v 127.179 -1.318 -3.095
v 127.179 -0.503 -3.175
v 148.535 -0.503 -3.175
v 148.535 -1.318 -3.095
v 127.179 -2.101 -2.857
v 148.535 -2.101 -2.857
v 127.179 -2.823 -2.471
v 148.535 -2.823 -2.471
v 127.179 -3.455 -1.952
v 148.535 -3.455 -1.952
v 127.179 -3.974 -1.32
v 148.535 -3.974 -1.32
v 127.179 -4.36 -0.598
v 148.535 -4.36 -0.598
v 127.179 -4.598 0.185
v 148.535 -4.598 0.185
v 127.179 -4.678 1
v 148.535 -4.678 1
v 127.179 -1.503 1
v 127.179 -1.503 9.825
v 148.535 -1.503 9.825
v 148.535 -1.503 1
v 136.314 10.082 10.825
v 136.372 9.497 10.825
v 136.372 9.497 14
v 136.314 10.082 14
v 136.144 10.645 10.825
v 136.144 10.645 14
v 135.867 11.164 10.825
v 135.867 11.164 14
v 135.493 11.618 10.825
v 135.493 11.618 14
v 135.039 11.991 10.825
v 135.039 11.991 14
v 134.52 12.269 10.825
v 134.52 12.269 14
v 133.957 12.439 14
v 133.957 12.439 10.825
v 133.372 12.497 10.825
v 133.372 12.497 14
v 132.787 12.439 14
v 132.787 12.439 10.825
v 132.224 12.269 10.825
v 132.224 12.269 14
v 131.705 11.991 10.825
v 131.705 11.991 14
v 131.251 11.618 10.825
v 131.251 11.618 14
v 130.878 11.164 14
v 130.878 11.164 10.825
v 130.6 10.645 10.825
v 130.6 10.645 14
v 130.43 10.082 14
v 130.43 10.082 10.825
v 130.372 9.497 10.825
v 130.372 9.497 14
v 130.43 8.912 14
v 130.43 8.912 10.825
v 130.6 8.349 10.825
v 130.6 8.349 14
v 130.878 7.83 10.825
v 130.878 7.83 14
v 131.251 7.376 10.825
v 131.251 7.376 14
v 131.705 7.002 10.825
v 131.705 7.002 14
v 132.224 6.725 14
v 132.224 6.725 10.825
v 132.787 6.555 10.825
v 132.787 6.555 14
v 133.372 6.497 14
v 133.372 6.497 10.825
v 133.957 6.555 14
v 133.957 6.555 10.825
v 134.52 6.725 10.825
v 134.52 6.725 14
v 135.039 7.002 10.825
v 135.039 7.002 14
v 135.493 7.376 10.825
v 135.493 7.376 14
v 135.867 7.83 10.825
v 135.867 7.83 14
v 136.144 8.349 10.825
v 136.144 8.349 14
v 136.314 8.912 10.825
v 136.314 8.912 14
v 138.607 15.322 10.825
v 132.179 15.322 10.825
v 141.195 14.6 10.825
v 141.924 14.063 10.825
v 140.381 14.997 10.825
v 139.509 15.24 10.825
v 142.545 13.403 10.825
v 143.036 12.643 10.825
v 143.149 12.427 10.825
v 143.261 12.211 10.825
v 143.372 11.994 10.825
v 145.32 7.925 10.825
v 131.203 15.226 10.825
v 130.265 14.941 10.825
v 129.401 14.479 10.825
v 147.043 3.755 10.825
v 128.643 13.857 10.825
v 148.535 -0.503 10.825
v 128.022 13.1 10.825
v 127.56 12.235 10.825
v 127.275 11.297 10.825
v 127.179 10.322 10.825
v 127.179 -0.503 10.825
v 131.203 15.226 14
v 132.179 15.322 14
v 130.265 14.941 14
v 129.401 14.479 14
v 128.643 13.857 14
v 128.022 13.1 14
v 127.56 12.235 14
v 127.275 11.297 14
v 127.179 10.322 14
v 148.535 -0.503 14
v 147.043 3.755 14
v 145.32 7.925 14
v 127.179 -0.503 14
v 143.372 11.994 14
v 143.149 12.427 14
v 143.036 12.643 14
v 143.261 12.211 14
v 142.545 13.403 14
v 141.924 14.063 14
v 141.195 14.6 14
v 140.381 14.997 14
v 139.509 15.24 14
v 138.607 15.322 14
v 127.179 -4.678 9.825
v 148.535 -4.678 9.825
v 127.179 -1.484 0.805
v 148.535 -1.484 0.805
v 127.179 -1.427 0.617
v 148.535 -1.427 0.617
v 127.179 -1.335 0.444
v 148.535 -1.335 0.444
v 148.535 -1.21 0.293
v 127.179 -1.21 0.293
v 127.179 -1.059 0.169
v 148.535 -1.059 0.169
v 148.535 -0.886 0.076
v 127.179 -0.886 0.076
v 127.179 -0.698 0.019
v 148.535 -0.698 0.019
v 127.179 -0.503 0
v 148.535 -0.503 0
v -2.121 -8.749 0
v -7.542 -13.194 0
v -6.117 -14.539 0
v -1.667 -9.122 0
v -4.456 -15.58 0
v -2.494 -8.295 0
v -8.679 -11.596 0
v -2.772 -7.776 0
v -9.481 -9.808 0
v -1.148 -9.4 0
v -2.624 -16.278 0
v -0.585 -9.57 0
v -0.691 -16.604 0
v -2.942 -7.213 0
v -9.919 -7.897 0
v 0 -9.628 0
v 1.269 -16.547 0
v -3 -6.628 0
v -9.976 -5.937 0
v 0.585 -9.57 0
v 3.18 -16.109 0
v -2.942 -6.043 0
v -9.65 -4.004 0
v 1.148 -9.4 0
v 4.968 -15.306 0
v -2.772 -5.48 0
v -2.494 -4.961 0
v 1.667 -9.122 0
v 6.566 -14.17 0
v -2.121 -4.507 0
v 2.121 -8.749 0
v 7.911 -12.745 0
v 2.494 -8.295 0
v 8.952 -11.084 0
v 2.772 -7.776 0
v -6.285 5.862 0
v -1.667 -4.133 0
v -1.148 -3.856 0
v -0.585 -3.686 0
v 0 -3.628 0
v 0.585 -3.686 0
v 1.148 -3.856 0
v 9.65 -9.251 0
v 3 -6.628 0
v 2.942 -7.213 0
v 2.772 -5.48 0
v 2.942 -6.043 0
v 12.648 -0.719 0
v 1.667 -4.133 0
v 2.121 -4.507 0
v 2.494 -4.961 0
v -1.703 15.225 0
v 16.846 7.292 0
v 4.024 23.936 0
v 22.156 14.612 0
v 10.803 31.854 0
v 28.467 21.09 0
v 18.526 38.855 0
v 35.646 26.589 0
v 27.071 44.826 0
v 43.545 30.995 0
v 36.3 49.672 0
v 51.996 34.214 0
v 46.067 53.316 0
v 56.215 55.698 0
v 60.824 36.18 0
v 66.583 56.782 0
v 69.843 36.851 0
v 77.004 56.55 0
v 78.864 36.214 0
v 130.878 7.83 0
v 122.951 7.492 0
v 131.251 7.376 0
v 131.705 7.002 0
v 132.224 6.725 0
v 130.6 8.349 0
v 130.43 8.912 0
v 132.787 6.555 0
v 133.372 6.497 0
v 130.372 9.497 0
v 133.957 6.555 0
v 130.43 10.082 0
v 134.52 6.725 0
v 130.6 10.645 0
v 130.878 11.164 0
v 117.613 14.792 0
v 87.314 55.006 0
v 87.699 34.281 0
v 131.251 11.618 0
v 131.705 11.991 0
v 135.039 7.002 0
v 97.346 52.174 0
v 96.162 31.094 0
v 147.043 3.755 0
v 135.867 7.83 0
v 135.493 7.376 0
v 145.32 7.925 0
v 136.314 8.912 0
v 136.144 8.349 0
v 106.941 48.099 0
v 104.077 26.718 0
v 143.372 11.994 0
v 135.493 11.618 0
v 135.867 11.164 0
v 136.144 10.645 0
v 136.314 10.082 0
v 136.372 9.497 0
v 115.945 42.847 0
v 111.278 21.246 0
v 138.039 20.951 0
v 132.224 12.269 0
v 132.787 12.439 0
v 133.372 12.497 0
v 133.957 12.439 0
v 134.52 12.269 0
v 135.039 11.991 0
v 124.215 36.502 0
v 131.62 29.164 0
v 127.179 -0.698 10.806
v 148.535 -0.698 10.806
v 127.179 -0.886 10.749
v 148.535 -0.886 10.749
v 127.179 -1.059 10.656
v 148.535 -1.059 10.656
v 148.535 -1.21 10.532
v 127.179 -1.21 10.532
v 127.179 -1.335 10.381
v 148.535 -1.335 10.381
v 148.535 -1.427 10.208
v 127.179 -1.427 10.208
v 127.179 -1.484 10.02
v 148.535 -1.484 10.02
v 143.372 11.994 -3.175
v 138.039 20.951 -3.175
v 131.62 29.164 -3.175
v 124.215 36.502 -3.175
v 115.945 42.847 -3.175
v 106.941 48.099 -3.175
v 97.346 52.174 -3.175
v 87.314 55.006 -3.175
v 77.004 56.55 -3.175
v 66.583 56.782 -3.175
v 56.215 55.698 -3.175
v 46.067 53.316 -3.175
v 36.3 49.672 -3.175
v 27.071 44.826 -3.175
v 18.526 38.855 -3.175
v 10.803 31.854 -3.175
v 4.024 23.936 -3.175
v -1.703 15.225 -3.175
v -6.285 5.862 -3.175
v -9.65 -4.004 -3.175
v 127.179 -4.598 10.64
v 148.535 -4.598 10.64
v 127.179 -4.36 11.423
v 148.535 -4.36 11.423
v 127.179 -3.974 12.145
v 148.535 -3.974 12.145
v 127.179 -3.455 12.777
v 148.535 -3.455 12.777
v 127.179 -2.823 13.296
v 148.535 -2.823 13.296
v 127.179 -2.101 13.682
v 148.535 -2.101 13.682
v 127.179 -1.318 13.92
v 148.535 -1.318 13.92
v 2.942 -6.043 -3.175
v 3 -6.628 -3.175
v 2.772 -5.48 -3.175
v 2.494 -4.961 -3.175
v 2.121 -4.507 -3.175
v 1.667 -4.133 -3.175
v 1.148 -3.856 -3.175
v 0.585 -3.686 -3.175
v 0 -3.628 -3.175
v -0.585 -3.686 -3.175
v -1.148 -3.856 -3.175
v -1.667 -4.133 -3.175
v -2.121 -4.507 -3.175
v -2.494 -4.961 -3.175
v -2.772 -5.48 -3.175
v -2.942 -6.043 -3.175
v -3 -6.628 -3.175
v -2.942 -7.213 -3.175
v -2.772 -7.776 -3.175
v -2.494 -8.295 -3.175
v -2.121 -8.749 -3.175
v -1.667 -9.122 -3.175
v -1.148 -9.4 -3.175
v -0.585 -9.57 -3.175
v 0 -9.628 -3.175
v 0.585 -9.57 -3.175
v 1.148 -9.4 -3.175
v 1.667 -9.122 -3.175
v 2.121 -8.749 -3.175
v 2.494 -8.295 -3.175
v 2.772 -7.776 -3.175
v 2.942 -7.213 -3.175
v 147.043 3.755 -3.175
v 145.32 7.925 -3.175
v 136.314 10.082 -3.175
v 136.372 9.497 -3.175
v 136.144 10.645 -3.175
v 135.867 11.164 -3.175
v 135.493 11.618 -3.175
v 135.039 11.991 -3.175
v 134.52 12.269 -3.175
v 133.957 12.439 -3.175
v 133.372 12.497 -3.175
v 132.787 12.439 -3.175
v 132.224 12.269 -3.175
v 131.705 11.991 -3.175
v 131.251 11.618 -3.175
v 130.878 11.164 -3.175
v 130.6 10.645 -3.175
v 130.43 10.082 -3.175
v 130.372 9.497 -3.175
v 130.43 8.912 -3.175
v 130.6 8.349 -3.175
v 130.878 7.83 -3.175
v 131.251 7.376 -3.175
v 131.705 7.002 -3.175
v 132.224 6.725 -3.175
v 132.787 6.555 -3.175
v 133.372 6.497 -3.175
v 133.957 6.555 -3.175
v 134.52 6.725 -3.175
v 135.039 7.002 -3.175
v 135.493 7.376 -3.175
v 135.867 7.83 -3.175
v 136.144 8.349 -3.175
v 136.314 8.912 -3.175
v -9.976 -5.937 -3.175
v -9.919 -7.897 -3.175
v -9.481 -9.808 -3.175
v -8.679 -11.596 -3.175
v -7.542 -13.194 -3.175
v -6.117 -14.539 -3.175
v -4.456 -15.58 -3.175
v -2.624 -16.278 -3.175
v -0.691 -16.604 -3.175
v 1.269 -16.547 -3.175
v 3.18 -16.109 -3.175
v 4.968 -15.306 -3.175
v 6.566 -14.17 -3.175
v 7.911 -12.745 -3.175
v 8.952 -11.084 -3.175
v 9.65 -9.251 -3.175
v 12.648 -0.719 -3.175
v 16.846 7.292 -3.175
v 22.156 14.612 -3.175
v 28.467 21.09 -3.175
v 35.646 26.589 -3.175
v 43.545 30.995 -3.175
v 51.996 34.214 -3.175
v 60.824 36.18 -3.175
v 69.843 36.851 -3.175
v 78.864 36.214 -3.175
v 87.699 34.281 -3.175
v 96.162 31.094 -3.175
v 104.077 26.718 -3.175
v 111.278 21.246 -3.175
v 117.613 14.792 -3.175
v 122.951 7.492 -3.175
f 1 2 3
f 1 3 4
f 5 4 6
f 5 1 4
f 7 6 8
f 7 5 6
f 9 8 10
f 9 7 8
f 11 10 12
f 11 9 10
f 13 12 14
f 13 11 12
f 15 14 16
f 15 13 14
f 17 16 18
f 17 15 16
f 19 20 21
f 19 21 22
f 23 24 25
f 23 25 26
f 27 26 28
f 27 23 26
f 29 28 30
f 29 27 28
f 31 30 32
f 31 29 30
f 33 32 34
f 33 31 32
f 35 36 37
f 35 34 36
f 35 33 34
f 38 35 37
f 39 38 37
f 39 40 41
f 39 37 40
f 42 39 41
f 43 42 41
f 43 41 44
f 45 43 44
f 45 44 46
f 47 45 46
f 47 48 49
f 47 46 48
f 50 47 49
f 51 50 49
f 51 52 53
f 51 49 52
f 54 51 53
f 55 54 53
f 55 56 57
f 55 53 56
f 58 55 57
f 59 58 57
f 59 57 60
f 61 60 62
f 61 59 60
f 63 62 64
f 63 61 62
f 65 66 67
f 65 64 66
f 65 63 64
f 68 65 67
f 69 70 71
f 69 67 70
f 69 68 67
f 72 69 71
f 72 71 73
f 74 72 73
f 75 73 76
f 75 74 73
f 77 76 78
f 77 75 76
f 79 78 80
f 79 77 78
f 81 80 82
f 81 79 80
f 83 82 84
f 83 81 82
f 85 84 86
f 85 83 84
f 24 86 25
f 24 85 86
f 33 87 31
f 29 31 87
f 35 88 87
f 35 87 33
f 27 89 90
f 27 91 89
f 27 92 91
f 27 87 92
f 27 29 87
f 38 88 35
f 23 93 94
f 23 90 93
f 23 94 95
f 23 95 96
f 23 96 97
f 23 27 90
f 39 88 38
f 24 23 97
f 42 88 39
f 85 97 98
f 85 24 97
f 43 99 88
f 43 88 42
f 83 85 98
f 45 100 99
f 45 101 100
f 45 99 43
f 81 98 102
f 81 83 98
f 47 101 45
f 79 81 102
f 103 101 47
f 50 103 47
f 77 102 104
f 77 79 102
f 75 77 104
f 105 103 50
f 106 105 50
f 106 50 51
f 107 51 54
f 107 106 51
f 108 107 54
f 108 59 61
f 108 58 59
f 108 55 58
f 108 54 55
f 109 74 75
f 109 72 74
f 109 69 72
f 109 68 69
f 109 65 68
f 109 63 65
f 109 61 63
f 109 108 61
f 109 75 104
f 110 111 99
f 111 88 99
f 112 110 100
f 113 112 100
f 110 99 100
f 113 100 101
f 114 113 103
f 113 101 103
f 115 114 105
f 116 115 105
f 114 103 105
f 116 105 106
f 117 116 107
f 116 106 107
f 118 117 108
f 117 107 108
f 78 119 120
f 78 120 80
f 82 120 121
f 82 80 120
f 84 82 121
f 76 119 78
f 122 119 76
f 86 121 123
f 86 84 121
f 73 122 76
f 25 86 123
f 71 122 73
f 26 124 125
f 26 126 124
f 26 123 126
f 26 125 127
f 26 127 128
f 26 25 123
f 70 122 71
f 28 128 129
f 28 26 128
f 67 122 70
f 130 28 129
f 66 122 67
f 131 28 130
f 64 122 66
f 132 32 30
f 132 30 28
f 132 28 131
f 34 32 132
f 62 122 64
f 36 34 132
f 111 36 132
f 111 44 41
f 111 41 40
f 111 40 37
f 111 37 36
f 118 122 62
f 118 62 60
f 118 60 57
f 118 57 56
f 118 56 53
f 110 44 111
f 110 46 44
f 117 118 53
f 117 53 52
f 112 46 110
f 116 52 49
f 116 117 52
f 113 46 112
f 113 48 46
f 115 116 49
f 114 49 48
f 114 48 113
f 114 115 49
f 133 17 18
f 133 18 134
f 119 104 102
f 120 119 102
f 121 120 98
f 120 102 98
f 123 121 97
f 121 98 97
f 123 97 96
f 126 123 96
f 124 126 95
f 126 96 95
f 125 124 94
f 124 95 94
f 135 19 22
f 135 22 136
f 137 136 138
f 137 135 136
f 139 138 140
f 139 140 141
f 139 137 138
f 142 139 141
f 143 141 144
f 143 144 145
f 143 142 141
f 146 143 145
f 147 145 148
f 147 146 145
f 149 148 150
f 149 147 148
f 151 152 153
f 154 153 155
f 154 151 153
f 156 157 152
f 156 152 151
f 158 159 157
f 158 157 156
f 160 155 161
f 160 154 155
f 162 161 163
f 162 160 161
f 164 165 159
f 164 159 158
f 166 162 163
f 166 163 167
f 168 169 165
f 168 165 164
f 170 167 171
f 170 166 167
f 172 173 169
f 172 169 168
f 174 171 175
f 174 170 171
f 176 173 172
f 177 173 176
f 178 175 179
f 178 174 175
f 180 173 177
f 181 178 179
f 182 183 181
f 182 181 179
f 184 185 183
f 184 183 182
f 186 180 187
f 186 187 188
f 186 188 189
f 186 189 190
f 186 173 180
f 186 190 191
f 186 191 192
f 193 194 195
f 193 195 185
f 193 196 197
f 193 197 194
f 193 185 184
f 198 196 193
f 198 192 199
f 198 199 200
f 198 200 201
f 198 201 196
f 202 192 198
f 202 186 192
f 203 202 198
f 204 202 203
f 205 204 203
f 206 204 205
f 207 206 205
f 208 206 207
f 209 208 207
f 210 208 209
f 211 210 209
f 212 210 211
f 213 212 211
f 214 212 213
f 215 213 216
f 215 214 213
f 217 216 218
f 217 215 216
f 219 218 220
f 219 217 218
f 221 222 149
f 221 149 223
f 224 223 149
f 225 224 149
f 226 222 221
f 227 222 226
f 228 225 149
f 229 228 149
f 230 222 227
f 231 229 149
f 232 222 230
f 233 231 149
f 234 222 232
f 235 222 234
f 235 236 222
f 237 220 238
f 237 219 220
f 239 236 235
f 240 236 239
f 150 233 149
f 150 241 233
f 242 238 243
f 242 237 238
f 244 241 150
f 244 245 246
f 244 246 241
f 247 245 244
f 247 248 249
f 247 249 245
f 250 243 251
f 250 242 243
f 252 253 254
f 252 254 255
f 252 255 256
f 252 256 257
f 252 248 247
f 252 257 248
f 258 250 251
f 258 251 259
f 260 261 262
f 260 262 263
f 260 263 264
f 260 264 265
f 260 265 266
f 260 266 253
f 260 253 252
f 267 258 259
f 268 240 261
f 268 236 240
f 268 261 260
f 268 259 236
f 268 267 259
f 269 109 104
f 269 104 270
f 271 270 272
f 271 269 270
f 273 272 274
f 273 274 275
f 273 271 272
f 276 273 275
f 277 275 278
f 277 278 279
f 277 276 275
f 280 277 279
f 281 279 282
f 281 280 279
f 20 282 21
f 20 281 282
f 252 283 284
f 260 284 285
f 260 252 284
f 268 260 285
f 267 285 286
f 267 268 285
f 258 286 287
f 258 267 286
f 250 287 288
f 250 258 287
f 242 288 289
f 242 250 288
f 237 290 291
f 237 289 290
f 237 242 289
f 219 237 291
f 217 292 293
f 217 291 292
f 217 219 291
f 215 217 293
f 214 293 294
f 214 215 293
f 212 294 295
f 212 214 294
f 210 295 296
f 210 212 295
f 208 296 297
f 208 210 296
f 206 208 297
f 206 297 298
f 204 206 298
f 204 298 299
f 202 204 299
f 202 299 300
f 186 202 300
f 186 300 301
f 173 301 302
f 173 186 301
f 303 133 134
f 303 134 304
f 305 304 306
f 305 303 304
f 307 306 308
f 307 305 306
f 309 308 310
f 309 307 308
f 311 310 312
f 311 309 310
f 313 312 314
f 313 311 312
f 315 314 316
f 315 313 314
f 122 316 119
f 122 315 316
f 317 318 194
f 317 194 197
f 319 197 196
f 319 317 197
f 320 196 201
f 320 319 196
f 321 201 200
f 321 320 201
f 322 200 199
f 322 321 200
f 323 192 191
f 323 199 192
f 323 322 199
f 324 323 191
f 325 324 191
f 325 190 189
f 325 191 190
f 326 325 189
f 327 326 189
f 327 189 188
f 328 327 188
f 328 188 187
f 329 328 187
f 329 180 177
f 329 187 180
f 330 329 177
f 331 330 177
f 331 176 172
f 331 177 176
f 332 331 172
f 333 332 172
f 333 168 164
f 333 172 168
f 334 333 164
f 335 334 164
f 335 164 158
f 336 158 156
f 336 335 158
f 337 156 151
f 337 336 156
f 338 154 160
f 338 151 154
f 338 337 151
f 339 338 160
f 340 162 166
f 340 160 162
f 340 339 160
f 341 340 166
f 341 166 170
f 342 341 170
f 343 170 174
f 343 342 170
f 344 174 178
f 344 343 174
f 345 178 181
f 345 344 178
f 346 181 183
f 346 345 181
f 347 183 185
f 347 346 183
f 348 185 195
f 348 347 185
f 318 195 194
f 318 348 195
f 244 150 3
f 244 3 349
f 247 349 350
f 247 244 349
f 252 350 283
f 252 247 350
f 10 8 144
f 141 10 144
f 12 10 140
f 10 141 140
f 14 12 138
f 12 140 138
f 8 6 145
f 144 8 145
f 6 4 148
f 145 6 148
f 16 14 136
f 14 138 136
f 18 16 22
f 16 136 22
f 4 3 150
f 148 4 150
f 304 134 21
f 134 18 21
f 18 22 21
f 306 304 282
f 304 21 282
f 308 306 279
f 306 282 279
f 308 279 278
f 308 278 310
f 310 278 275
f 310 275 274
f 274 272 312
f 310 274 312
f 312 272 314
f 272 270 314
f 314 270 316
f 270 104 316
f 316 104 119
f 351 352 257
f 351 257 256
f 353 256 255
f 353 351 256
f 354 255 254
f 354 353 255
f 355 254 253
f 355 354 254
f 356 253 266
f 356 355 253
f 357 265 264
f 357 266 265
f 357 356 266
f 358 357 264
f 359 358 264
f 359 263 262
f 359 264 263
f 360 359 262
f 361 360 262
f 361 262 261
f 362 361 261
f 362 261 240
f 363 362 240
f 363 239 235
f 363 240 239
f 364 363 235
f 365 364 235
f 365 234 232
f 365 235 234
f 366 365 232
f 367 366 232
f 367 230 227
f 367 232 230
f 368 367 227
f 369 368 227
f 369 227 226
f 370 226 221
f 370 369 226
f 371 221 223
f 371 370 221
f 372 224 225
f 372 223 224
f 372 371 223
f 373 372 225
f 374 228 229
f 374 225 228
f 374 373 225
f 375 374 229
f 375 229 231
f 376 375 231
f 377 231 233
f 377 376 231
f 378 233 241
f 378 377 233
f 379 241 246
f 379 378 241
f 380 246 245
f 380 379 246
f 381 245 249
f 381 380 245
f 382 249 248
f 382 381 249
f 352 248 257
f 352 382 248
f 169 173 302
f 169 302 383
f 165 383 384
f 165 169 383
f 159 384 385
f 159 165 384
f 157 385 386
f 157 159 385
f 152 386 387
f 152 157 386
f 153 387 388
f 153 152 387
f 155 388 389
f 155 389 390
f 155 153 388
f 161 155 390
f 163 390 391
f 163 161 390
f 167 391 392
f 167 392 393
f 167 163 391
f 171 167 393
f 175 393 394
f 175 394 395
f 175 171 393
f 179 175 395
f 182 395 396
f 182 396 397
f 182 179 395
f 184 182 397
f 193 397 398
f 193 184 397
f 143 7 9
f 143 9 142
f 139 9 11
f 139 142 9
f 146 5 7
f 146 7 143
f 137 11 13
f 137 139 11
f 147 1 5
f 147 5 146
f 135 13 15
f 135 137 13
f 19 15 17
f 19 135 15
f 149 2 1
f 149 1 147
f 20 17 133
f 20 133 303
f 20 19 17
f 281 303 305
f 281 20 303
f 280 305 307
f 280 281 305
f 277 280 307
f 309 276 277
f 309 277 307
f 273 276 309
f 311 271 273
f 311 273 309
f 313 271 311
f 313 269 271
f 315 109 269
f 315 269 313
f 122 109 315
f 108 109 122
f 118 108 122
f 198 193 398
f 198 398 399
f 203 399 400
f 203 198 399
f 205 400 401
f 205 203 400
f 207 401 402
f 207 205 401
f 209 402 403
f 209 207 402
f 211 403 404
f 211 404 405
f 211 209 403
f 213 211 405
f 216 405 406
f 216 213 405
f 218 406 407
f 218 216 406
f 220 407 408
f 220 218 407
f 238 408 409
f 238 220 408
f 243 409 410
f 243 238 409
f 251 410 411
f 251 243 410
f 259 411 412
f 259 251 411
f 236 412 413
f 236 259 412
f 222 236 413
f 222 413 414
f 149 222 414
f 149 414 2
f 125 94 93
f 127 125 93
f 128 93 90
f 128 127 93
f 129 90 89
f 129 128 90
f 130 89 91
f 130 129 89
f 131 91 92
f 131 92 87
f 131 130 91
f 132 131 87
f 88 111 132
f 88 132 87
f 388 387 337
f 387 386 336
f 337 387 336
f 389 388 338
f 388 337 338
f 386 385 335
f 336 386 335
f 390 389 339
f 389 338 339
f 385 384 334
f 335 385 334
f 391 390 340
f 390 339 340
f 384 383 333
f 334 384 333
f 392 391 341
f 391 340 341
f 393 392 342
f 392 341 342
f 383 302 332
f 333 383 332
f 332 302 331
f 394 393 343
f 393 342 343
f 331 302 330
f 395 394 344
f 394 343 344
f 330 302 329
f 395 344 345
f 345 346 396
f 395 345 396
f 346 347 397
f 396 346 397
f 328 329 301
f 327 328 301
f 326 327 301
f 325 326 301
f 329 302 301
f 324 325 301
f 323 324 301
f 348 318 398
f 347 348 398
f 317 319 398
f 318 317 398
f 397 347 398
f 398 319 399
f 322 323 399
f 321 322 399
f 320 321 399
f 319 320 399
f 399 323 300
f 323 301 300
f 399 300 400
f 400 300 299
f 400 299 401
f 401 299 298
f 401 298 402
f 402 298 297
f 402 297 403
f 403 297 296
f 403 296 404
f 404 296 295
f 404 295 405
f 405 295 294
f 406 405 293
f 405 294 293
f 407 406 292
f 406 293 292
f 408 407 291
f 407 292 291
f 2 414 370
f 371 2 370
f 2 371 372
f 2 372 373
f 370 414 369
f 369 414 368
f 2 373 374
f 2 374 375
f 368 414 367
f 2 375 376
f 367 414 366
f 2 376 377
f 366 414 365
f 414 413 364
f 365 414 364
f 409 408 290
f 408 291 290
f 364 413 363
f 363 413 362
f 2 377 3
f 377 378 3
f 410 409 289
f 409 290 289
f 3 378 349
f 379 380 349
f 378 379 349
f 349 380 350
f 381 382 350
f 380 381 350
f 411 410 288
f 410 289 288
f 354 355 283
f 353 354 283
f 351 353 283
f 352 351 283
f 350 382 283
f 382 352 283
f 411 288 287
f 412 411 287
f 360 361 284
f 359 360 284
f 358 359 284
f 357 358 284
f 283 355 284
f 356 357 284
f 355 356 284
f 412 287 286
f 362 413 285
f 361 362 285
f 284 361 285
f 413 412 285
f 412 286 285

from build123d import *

# Parameters (mm, degrees)
BASE_FLANGE1_DEPTH           = 3.175
EDGE_FLANGE1_DEPTH           = 21.356037378
EDGE_FLANGE2_STRIP_W         = 14.7
EDGE_FLANGE2_STRIP_H         = 3.175
EDGE_FLANGE2_STRIP_CUT_DEPTH = 21.356037378
EDGE_FLANGE2_DEPTH           = 21.356037378
CUT_EXTRUDE1_DEPTH           = 160.658100285
CUT_EXTRUDE1_DEPTH_BACK      = 160.658100285
SKETCH12_R                   = 3
FILLET1_R                    = 5


# Sheet-metal steps are written as plain solids
with BuildPart() as part:
    # Sketch1 → Base-Flange1 (new body)
    with BuildSketch(Plane.XY):
        with BuildLine():
            Line((127.178904259, -0.503108866), (143.372130178, -0.503108866))
            Line((143.372130178, -0.503108866), (148.534941637, -0.503108866))
            ThreePointArc((148.534941637, -0.503108866), (146.210001092, 5.851436917), (143.372130178, 11.994082058))
            ThreePointArc((143.372130178, 11.994082058), (61.381820352, 56.404158269), (-9.649714749, -4.004341098))
            ThreePointArc((-9.649714749, -4.004341098), (-2.623548221, -16.277604067), (9.649714749, -9.251437539))
            ThreePointArc((9.649714749, -9.251437539), (65.321056088, 36.678957766), (127.178904259, -0.503108866))
        make_face()
    extrude(amount=-BASE_FLANGE1_DEPTH)

    # Edge-Flange1 section (across the edge) → Edge-Flange1 (add)
    with BuildSketch(Plane(origin=(127.178904259, -1.503108866, 0), x_dir=(0, 1, 0), z_dir=(1, 0, 0))):
        with BuildLine():
            Line((-3.175, 1), (-3.175, 10.825))
            Line((-3.175, 10.825), (0, 10.825))
            Line((0, 10.825), (0, 1))
            ThreePointArc((0, 1), (0.292893219, 0.292893219), (1, 0))
            Line((1, 0), (1, -3.175))
            ThreePointArc((1, -3.175), (-1.952170811, -1.952170811), (-3.175, 1))
        make_face()
    extrude(amount=EDGE_FLANGE1_DEPTH)

    # Edge-Flange2 strip (across the edge) → Edge-Flange2 strip cut (cut)
    with BuildSketch(Plane(origin=(127.178904259, -1.503108866, 10.825), x_dir=(0, 0, -1), z_dir=(1, 0, 0))):
        with Locations((-6.35, -1.5875)):
            Rectangle(EDGE_FLANGE2_STRIP_W, EDGE_FLANGE2_STRIP_H)
    extrude(amount=EDGE_FLANGE2_STRIP_CUT_DEPTH, mode=Mode.SUBTRACT)

    # Edge-Flange2 section (across the edge) → Edge-Flange2 (add)
    with BuildSketch(Plane(origin=(127.178904259, -1.503108866, 10.825), x_dir=(0, 0, -1), z_dir=(1, 0, 0))):
        with BuildLine():
            Line((-3.175, 1), (-3.175, 16.825))
            Line((-3.175, 16.825), (0, 16.825))
            Line((0, 16.825), (0, 1))
            ThreePointArc((0, 1), (0.292893219, 0.292893219), (1, 0))
            Line((1, 0), (1, -3.175))
            ThreePointArc((1, -3.175), (-1.952170811, -1.952170811), (-3.175, 1))
        make_face()
    extrude(amount=EDGE_FLANGE2_DEPTH)

    # Sketch12 → Cut-Extrude1 (cut, two sides: drawn at the far end of the back side and taken through both)
    with BuildSketch(Plane.XY.offset(-CUT_EXTRUDE1_DEPTH_BACK)):
        with Locations((133.372130178, 9.496891134)):
            Circle(SKETCH12_R)
        with Locations((0, -6.627889318)):
            Circle(SKETCH12_R)
        with BuildLine():
            Line((141.568166958, 15.321891134), (148.534941637, 15.321891134))
            Line((148.534941637, 15.321891134), (148.534941637, -0.503108866))
            ThreePointArc((148.534941637, -0.503108866), (146.210001092, 5.851436917), (143.372130178, 11.994082058))
            ThreePointArc((143.372130178, 11.994082058), (142.48923714, 13.66833427), (141.568166958, 15.321891134))
        make_face()
    extrude(amount=CUT_EXTRUDE1_DEPTH + CUT_EXTRUDE1_DEPTH_BACK, mode=Mode.SUBTRACT)

    # Fillet1
    fillet1_edges = [part.edges().sort_by_distance(p)[0] for p in [
        (127.178904259, 15.321891134, 12.4125),
        (141.568166958, 15.321891134, 12.4125),
    ]]
    fillet(fillet1_edges, radius=FILLET1_R)


solid = part.part
